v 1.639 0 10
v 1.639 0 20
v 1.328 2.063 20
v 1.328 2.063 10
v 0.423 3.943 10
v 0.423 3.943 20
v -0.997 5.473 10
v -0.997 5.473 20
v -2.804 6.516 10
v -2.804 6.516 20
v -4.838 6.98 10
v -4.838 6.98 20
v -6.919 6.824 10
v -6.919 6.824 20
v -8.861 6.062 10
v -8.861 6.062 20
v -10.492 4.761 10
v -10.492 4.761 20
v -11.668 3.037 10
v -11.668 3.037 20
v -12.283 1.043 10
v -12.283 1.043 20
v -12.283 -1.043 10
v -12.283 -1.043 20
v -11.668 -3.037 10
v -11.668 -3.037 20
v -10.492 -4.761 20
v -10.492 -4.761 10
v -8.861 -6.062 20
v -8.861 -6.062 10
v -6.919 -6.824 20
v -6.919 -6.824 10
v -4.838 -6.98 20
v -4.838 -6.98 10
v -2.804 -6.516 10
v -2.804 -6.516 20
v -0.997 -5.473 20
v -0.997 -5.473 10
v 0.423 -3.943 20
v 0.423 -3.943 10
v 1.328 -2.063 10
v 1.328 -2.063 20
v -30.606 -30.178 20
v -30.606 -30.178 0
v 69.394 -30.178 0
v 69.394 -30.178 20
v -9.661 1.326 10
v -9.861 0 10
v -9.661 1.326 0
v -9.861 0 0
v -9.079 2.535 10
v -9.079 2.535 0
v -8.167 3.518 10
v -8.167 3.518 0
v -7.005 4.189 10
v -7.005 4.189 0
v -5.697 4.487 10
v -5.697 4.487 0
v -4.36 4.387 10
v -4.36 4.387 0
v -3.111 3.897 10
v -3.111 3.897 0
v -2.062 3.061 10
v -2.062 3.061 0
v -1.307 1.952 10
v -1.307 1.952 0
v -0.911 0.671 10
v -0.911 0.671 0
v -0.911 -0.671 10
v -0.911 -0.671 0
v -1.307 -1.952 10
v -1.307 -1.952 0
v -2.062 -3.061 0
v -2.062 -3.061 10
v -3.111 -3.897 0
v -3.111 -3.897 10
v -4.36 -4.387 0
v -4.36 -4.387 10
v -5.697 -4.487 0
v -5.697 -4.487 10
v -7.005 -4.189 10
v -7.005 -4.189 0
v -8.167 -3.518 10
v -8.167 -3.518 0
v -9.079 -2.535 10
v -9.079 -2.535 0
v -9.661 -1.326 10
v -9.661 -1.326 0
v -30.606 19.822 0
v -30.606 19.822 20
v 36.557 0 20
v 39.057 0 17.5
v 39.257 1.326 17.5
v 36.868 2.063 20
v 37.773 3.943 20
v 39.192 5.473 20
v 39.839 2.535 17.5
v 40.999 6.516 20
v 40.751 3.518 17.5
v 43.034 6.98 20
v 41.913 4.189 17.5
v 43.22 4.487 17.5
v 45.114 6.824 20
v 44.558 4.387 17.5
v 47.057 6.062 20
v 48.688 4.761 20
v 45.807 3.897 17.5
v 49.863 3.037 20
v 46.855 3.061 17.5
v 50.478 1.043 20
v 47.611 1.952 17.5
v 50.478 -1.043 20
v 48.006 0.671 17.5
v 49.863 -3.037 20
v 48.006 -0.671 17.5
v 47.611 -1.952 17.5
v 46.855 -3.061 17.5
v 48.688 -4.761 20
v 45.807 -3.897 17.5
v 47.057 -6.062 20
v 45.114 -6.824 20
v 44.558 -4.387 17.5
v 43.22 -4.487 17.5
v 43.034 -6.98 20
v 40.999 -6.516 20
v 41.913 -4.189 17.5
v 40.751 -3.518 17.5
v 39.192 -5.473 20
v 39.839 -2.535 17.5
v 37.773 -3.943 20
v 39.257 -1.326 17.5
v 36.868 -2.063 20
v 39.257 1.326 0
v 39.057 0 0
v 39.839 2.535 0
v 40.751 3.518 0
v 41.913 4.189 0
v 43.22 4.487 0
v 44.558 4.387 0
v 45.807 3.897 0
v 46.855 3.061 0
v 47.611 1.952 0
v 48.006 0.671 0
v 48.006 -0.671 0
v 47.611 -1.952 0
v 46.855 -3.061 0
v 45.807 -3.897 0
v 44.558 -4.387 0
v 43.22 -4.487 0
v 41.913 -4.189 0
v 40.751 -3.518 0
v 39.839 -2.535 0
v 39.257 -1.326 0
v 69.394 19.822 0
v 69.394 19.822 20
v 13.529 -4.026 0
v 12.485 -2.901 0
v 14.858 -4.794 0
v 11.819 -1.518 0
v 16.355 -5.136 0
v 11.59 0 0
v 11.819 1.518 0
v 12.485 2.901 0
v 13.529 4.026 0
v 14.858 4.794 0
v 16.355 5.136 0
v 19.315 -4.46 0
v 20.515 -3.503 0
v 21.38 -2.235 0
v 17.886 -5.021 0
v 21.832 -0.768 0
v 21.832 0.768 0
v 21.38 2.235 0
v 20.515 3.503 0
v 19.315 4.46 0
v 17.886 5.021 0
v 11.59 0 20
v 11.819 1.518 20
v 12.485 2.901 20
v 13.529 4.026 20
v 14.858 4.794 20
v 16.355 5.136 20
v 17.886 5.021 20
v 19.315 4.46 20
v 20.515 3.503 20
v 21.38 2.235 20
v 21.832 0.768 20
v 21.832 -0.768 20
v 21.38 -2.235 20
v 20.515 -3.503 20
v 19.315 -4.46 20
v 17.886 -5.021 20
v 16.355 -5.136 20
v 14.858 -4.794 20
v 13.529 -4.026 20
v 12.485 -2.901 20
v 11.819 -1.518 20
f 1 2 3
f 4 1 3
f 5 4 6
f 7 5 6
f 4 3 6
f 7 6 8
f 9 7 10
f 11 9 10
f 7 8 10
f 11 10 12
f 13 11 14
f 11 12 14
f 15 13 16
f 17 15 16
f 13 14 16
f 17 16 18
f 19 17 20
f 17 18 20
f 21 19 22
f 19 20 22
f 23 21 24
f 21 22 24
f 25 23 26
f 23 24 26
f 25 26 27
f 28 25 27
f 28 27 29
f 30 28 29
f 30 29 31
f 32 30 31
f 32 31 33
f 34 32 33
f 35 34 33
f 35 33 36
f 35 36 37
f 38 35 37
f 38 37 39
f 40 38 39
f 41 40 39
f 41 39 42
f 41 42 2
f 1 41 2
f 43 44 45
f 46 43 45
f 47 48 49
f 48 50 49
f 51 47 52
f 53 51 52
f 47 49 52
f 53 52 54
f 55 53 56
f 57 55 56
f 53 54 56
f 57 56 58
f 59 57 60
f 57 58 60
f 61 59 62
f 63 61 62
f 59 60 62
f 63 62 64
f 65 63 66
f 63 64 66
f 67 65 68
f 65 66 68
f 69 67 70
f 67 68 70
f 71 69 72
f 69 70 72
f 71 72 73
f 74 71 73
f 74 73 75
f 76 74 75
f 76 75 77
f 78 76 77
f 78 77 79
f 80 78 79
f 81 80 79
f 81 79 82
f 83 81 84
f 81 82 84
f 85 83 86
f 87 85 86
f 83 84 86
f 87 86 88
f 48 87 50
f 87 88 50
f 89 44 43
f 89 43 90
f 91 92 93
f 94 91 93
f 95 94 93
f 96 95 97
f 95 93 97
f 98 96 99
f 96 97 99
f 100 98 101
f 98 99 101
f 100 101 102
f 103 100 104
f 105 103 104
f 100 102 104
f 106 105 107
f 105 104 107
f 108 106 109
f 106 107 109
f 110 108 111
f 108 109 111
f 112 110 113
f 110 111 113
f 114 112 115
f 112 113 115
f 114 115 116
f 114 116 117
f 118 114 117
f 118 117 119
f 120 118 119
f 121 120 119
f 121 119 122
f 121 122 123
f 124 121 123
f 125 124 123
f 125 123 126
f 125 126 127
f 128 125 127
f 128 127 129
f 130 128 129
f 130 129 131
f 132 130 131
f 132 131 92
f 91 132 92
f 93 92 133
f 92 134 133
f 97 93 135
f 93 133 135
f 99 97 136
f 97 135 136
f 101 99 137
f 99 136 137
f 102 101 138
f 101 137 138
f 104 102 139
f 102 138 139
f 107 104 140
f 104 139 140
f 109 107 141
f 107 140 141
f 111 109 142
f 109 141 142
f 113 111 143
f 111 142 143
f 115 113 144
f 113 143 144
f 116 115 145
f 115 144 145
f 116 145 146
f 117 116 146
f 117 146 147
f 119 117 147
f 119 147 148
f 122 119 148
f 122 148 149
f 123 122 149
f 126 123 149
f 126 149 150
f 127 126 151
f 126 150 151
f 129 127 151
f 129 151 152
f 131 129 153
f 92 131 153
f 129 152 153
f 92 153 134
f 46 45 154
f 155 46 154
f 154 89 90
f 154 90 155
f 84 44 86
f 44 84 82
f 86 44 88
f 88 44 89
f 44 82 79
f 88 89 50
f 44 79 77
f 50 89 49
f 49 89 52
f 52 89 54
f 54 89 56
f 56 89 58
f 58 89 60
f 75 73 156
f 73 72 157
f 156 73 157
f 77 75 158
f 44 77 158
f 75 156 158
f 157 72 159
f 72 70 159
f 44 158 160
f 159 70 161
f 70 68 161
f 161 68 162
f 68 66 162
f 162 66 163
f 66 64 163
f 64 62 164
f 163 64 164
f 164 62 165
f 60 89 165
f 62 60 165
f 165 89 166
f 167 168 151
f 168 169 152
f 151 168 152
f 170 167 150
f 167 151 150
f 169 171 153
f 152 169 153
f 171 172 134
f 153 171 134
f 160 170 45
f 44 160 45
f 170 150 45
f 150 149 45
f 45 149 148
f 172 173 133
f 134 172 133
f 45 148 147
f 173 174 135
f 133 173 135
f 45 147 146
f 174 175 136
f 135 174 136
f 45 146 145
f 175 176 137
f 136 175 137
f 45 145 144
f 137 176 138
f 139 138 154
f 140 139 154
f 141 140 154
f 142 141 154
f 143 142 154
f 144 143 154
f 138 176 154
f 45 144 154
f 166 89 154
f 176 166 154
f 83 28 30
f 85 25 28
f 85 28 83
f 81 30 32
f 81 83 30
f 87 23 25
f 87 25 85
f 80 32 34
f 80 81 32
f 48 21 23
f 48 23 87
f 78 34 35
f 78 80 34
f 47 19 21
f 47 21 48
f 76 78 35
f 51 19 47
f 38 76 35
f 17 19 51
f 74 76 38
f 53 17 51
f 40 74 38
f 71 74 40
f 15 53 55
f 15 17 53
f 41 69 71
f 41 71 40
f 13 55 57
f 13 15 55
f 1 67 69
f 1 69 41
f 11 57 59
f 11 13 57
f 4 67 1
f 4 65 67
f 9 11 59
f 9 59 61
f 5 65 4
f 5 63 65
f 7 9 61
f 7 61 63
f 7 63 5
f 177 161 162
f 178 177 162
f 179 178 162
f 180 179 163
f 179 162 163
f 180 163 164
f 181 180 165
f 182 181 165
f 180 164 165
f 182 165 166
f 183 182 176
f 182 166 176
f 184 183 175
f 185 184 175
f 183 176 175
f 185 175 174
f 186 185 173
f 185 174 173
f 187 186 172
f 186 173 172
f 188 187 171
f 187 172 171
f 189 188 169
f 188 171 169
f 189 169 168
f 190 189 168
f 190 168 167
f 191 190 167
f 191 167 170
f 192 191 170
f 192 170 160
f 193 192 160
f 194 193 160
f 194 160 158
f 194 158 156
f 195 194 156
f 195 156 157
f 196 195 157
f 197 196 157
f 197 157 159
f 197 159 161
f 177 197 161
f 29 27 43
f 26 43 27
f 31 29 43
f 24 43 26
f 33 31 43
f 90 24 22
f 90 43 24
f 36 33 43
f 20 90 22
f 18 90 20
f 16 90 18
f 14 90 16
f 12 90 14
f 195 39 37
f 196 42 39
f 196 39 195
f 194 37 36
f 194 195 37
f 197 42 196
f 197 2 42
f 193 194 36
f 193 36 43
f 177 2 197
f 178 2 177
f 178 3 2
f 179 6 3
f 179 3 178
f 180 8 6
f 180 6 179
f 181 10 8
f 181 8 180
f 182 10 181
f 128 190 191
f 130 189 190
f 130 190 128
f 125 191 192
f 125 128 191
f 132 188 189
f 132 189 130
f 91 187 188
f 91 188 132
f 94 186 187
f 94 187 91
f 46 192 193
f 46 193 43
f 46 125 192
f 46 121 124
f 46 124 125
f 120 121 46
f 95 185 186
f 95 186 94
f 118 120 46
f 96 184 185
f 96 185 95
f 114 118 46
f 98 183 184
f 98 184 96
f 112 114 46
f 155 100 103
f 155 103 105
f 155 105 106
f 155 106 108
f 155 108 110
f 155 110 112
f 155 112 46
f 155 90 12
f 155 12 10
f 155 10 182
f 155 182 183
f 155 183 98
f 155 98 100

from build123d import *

# Parameters (mm, degrees)
F0_W           = 100
F0_H           = 50
F1_DEPTH       = 20
F3_D           = 9
F3_DEPTH       = 30
F3_CBORE_D     = 14
F3_CBORE_DEPTH = 10
F3_TIP         = 2.7038727856
F4_D           = 9
F4_CSINK_D     = 14
F4_CSINK_ANGLE = 90
F5_D           = 10.3


with BuildPart() as f1:
    # F0 (on Top) → F1 (new body)
    with BuildSketch(Plane.XY):
        with Locations((19.3940885365, -5.1782257724)):
            Rectangle(F0_W, F0_H)
    extrude(amount=F1_DEPTH)

    # F3
    with Locations(Plane.XY.offset(20)):
        with Locations((-5.3611323237, 0)):
            CounterBoreHole(F3_D / 2, F3_CBORE_D / 2, F3_CBORE_DEPTH, depth=F3_DEPTH)
            with Locations((0, 0, -(F3_DEPTH + F3_TIP / 2))):  # 118° drill point
                Cone(0, F3_D / 2, F3_TIP, mode=Mode.SUBTRACT)

    # F4 (through all)
    with Locations(Plane.XY.offset(20)):
        with Locations((43.5566157103, 0)):
            CounterSinkHole(F4_D / 2, F4_CSINK_D / 2, counter_sink_angle=F4_CSINK_ANGLE)

    # F5 (through all)
    with Locations(Plane.XY.offset(20)):
        with Locations((16.7399458587, 0)):
            Hole(F5_D / 2)


solid = f1.part
